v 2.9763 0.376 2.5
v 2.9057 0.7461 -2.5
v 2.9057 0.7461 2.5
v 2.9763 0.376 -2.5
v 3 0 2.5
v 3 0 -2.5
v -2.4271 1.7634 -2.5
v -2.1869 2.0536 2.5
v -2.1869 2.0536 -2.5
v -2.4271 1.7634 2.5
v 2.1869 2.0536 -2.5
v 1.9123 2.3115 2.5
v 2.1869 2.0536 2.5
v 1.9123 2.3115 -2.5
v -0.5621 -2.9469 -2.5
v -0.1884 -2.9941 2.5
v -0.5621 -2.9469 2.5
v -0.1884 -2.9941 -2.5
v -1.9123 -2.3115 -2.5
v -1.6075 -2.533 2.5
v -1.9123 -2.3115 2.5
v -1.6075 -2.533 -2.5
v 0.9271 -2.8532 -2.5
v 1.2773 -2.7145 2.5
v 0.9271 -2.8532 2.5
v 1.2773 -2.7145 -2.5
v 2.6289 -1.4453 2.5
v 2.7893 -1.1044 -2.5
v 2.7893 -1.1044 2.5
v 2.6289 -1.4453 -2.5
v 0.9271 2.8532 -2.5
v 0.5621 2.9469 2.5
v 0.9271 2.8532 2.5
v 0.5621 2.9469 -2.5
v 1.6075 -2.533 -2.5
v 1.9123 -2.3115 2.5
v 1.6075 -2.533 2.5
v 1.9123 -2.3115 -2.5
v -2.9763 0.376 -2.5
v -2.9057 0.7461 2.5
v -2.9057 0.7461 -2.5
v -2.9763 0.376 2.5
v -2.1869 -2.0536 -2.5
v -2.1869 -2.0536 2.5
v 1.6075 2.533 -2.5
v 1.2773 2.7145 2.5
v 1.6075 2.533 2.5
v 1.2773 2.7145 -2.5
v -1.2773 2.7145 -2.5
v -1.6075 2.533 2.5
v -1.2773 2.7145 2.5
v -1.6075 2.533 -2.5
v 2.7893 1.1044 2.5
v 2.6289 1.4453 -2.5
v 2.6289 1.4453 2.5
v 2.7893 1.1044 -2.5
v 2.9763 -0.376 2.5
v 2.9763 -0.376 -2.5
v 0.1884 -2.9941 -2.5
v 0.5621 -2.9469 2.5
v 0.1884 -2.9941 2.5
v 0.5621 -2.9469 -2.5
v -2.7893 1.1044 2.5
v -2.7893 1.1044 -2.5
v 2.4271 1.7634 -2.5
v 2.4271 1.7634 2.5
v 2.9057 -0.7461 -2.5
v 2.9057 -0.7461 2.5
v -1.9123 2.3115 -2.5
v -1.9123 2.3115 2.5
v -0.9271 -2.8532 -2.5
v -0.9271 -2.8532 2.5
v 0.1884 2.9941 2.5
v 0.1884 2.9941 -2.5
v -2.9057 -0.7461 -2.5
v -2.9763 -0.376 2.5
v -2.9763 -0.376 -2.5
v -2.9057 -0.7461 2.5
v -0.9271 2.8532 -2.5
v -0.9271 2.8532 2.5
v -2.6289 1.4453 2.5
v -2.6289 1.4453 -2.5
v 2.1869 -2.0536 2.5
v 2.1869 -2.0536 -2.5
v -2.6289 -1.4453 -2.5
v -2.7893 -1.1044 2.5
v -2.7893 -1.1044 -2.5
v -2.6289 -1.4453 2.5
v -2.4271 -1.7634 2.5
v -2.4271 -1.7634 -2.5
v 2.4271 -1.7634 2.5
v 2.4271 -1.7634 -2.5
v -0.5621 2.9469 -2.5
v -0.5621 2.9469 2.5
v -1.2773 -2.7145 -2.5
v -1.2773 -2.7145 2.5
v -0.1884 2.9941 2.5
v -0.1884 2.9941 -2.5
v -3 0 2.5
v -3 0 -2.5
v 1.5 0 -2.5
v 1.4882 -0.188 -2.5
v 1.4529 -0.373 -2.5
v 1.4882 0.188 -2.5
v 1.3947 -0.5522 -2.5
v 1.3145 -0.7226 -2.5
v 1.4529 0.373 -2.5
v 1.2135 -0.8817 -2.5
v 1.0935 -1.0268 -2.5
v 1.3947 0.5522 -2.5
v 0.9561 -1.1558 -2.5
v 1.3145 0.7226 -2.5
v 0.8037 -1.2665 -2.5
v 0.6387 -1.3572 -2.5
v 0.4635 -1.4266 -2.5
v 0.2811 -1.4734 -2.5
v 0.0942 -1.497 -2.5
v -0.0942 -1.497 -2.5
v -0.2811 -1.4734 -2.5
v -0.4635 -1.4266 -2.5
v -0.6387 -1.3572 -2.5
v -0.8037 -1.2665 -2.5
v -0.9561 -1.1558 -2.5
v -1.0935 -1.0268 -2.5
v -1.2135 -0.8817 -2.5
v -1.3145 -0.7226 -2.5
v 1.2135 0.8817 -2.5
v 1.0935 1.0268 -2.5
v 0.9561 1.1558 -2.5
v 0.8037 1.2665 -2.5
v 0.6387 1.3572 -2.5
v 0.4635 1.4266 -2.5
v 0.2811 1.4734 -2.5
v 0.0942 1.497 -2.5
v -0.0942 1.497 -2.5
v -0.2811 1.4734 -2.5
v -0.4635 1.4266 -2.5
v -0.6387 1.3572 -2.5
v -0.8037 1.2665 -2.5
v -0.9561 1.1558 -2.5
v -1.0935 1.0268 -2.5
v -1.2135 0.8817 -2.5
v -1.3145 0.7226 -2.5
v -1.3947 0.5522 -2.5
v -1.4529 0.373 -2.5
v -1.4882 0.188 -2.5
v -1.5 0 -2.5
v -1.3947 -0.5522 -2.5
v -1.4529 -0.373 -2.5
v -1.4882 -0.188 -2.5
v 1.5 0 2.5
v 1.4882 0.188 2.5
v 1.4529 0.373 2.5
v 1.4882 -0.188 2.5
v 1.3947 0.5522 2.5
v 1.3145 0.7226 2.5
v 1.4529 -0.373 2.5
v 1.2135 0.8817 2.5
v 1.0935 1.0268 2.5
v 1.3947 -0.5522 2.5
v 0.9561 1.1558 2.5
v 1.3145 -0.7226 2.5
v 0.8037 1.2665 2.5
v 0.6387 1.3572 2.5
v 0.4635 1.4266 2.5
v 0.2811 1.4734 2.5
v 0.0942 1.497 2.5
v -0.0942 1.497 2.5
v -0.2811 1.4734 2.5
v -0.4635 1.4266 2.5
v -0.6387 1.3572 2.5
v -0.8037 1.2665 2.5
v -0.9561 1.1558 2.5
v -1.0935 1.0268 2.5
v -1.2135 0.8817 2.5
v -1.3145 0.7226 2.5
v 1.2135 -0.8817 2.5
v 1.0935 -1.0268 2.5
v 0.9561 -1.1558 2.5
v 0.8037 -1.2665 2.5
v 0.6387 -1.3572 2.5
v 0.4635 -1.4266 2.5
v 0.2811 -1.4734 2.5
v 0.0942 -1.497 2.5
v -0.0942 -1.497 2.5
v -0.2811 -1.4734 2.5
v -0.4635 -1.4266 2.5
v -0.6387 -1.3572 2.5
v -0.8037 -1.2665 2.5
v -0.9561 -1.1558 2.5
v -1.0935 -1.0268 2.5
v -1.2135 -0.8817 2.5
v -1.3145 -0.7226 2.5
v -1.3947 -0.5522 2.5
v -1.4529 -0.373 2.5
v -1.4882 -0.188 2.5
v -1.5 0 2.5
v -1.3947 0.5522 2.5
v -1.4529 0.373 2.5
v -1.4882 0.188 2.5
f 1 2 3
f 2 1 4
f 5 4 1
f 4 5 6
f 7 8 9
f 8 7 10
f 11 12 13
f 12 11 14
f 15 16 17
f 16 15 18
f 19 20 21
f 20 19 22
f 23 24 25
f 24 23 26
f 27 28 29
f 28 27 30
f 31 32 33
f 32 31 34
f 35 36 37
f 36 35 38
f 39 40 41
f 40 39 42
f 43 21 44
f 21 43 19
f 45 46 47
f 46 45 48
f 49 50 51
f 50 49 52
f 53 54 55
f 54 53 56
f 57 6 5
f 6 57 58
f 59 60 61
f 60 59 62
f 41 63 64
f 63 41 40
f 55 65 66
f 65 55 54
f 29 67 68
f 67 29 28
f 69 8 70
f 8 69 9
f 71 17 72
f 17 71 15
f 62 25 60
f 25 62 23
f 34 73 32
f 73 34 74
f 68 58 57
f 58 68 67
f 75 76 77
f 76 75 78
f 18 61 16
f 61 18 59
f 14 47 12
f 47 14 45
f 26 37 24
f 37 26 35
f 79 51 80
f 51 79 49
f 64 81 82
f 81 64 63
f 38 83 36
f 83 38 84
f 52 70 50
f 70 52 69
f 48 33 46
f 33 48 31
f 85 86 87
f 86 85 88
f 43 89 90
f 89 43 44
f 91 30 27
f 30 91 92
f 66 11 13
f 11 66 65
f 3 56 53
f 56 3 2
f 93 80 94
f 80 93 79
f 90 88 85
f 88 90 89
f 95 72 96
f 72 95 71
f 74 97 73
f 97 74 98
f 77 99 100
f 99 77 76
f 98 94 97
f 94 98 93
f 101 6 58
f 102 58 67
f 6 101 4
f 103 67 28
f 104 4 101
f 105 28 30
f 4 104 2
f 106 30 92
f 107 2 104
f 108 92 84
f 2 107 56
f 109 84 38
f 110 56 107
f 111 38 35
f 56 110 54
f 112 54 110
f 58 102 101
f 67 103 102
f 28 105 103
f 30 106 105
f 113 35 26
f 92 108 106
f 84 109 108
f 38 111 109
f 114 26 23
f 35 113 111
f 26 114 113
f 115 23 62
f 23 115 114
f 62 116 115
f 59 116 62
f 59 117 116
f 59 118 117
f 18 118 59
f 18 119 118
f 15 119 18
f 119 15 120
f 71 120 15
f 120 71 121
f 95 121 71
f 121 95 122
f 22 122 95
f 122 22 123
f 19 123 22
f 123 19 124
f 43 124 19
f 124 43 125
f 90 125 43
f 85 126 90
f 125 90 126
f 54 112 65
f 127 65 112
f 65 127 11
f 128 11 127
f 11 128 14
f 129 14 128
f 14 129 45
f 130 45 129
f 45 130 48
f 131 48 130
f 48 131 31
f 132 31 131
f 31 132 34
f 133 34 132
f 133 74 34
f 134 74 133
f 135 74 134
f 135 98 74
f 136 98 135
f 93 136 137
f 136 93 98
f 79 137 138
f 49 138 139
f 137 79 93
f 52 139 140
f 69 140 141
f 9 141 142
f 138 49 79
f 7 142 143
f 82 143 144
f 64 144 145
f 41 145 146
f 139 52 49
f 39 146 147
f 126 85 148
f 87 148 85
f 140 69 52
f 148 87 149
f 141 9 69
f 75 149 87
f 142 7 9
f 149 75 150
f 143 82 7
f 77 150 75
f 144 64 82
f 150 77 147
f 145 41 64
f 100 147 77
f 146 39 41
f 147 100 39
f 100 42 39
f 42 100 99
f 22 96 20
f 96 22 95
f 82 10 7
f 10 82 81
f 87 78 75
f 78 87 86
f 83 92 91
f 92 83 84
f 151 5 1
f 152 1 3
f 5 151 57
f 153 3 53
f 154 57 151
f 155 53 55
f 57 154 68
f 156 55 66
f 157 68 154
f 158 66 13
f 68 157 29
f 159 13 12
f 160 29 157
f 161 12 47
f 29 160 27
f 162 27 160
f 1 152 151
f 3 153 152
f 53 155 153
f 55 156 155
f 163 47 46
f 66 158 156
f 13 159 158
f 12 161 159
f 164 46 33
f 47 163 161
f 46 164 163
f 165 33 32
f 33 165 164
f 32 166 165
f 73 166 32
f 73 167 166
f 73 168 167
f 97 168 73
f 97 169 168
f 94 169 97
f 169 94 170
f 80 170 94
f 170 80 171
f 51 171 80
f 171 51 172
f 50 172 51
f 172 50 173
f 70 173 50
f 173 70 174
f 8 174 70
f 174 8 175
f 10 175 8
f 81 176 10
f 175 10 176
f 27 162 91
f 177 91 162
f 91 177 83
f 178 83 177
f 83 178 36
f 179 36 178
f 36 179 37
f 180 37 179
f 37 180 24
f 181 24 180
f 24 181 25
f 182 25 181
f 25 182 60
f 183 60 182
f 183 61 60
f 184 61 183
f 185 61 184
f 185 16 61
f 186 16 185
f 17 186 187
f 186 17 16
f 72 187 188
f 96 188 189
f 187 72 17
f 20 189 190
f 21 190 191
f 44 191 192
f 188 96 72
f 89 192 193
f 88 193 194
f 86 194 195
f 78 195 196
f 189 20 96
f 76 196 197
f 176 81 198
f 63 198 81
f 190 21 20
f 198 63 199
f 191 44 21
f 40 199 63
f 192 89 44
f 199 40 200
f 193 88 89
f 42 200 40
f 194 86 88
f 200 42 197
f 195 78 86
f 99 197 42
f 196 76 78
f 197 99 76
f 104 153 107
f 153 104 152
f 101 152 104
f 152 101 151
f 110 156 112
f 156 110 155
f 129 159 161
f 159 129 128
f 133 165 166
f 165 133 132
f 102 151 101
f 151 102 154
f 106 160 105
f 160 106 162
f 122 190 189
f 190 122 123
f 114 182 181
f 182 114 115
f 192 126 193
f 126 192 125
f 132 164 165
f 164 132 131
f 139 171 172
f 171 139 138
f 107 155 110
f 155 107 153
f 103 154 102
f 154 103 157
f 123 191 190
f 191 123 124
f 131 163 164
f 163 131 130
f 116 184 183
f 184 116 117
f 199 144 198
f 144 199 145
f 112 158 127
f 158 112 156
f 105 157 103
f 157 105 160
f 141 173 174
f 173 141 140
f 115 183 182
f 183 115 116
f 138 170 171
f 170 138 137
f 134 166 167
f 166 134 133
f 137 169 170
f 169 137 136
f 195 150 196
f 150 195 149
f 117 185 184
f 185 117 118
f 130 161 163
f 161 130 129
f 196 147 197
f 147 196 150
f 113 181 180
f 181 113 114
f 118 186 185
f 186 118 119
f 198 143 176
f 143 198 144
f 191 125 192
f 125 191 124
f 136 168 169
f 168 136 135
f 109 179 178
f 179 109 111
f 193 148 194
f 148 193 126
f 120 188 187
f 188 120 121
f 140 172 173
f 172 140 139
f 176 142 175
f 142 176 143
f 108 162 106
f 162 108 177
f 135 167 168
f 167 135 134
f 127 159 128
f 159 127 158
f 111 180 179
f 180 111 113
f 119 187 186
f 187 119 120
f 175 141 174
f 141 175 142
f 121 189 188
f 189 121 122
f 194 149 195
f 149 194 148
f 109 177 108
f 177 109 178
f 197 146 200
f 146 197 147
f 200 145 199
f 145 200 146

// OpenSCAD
$fn = 50;


difference() {
	union() {
		translate(v = [0, 0, -2.5000000000]) {
			cylinder(h = 5, r = 3.0000000000);
		}
	}
	union() {
		translate(v = [0, 0, -100.0000000000]) {
			cylinder(h = 200, r = 1.5000000000);
		}
	}
}
